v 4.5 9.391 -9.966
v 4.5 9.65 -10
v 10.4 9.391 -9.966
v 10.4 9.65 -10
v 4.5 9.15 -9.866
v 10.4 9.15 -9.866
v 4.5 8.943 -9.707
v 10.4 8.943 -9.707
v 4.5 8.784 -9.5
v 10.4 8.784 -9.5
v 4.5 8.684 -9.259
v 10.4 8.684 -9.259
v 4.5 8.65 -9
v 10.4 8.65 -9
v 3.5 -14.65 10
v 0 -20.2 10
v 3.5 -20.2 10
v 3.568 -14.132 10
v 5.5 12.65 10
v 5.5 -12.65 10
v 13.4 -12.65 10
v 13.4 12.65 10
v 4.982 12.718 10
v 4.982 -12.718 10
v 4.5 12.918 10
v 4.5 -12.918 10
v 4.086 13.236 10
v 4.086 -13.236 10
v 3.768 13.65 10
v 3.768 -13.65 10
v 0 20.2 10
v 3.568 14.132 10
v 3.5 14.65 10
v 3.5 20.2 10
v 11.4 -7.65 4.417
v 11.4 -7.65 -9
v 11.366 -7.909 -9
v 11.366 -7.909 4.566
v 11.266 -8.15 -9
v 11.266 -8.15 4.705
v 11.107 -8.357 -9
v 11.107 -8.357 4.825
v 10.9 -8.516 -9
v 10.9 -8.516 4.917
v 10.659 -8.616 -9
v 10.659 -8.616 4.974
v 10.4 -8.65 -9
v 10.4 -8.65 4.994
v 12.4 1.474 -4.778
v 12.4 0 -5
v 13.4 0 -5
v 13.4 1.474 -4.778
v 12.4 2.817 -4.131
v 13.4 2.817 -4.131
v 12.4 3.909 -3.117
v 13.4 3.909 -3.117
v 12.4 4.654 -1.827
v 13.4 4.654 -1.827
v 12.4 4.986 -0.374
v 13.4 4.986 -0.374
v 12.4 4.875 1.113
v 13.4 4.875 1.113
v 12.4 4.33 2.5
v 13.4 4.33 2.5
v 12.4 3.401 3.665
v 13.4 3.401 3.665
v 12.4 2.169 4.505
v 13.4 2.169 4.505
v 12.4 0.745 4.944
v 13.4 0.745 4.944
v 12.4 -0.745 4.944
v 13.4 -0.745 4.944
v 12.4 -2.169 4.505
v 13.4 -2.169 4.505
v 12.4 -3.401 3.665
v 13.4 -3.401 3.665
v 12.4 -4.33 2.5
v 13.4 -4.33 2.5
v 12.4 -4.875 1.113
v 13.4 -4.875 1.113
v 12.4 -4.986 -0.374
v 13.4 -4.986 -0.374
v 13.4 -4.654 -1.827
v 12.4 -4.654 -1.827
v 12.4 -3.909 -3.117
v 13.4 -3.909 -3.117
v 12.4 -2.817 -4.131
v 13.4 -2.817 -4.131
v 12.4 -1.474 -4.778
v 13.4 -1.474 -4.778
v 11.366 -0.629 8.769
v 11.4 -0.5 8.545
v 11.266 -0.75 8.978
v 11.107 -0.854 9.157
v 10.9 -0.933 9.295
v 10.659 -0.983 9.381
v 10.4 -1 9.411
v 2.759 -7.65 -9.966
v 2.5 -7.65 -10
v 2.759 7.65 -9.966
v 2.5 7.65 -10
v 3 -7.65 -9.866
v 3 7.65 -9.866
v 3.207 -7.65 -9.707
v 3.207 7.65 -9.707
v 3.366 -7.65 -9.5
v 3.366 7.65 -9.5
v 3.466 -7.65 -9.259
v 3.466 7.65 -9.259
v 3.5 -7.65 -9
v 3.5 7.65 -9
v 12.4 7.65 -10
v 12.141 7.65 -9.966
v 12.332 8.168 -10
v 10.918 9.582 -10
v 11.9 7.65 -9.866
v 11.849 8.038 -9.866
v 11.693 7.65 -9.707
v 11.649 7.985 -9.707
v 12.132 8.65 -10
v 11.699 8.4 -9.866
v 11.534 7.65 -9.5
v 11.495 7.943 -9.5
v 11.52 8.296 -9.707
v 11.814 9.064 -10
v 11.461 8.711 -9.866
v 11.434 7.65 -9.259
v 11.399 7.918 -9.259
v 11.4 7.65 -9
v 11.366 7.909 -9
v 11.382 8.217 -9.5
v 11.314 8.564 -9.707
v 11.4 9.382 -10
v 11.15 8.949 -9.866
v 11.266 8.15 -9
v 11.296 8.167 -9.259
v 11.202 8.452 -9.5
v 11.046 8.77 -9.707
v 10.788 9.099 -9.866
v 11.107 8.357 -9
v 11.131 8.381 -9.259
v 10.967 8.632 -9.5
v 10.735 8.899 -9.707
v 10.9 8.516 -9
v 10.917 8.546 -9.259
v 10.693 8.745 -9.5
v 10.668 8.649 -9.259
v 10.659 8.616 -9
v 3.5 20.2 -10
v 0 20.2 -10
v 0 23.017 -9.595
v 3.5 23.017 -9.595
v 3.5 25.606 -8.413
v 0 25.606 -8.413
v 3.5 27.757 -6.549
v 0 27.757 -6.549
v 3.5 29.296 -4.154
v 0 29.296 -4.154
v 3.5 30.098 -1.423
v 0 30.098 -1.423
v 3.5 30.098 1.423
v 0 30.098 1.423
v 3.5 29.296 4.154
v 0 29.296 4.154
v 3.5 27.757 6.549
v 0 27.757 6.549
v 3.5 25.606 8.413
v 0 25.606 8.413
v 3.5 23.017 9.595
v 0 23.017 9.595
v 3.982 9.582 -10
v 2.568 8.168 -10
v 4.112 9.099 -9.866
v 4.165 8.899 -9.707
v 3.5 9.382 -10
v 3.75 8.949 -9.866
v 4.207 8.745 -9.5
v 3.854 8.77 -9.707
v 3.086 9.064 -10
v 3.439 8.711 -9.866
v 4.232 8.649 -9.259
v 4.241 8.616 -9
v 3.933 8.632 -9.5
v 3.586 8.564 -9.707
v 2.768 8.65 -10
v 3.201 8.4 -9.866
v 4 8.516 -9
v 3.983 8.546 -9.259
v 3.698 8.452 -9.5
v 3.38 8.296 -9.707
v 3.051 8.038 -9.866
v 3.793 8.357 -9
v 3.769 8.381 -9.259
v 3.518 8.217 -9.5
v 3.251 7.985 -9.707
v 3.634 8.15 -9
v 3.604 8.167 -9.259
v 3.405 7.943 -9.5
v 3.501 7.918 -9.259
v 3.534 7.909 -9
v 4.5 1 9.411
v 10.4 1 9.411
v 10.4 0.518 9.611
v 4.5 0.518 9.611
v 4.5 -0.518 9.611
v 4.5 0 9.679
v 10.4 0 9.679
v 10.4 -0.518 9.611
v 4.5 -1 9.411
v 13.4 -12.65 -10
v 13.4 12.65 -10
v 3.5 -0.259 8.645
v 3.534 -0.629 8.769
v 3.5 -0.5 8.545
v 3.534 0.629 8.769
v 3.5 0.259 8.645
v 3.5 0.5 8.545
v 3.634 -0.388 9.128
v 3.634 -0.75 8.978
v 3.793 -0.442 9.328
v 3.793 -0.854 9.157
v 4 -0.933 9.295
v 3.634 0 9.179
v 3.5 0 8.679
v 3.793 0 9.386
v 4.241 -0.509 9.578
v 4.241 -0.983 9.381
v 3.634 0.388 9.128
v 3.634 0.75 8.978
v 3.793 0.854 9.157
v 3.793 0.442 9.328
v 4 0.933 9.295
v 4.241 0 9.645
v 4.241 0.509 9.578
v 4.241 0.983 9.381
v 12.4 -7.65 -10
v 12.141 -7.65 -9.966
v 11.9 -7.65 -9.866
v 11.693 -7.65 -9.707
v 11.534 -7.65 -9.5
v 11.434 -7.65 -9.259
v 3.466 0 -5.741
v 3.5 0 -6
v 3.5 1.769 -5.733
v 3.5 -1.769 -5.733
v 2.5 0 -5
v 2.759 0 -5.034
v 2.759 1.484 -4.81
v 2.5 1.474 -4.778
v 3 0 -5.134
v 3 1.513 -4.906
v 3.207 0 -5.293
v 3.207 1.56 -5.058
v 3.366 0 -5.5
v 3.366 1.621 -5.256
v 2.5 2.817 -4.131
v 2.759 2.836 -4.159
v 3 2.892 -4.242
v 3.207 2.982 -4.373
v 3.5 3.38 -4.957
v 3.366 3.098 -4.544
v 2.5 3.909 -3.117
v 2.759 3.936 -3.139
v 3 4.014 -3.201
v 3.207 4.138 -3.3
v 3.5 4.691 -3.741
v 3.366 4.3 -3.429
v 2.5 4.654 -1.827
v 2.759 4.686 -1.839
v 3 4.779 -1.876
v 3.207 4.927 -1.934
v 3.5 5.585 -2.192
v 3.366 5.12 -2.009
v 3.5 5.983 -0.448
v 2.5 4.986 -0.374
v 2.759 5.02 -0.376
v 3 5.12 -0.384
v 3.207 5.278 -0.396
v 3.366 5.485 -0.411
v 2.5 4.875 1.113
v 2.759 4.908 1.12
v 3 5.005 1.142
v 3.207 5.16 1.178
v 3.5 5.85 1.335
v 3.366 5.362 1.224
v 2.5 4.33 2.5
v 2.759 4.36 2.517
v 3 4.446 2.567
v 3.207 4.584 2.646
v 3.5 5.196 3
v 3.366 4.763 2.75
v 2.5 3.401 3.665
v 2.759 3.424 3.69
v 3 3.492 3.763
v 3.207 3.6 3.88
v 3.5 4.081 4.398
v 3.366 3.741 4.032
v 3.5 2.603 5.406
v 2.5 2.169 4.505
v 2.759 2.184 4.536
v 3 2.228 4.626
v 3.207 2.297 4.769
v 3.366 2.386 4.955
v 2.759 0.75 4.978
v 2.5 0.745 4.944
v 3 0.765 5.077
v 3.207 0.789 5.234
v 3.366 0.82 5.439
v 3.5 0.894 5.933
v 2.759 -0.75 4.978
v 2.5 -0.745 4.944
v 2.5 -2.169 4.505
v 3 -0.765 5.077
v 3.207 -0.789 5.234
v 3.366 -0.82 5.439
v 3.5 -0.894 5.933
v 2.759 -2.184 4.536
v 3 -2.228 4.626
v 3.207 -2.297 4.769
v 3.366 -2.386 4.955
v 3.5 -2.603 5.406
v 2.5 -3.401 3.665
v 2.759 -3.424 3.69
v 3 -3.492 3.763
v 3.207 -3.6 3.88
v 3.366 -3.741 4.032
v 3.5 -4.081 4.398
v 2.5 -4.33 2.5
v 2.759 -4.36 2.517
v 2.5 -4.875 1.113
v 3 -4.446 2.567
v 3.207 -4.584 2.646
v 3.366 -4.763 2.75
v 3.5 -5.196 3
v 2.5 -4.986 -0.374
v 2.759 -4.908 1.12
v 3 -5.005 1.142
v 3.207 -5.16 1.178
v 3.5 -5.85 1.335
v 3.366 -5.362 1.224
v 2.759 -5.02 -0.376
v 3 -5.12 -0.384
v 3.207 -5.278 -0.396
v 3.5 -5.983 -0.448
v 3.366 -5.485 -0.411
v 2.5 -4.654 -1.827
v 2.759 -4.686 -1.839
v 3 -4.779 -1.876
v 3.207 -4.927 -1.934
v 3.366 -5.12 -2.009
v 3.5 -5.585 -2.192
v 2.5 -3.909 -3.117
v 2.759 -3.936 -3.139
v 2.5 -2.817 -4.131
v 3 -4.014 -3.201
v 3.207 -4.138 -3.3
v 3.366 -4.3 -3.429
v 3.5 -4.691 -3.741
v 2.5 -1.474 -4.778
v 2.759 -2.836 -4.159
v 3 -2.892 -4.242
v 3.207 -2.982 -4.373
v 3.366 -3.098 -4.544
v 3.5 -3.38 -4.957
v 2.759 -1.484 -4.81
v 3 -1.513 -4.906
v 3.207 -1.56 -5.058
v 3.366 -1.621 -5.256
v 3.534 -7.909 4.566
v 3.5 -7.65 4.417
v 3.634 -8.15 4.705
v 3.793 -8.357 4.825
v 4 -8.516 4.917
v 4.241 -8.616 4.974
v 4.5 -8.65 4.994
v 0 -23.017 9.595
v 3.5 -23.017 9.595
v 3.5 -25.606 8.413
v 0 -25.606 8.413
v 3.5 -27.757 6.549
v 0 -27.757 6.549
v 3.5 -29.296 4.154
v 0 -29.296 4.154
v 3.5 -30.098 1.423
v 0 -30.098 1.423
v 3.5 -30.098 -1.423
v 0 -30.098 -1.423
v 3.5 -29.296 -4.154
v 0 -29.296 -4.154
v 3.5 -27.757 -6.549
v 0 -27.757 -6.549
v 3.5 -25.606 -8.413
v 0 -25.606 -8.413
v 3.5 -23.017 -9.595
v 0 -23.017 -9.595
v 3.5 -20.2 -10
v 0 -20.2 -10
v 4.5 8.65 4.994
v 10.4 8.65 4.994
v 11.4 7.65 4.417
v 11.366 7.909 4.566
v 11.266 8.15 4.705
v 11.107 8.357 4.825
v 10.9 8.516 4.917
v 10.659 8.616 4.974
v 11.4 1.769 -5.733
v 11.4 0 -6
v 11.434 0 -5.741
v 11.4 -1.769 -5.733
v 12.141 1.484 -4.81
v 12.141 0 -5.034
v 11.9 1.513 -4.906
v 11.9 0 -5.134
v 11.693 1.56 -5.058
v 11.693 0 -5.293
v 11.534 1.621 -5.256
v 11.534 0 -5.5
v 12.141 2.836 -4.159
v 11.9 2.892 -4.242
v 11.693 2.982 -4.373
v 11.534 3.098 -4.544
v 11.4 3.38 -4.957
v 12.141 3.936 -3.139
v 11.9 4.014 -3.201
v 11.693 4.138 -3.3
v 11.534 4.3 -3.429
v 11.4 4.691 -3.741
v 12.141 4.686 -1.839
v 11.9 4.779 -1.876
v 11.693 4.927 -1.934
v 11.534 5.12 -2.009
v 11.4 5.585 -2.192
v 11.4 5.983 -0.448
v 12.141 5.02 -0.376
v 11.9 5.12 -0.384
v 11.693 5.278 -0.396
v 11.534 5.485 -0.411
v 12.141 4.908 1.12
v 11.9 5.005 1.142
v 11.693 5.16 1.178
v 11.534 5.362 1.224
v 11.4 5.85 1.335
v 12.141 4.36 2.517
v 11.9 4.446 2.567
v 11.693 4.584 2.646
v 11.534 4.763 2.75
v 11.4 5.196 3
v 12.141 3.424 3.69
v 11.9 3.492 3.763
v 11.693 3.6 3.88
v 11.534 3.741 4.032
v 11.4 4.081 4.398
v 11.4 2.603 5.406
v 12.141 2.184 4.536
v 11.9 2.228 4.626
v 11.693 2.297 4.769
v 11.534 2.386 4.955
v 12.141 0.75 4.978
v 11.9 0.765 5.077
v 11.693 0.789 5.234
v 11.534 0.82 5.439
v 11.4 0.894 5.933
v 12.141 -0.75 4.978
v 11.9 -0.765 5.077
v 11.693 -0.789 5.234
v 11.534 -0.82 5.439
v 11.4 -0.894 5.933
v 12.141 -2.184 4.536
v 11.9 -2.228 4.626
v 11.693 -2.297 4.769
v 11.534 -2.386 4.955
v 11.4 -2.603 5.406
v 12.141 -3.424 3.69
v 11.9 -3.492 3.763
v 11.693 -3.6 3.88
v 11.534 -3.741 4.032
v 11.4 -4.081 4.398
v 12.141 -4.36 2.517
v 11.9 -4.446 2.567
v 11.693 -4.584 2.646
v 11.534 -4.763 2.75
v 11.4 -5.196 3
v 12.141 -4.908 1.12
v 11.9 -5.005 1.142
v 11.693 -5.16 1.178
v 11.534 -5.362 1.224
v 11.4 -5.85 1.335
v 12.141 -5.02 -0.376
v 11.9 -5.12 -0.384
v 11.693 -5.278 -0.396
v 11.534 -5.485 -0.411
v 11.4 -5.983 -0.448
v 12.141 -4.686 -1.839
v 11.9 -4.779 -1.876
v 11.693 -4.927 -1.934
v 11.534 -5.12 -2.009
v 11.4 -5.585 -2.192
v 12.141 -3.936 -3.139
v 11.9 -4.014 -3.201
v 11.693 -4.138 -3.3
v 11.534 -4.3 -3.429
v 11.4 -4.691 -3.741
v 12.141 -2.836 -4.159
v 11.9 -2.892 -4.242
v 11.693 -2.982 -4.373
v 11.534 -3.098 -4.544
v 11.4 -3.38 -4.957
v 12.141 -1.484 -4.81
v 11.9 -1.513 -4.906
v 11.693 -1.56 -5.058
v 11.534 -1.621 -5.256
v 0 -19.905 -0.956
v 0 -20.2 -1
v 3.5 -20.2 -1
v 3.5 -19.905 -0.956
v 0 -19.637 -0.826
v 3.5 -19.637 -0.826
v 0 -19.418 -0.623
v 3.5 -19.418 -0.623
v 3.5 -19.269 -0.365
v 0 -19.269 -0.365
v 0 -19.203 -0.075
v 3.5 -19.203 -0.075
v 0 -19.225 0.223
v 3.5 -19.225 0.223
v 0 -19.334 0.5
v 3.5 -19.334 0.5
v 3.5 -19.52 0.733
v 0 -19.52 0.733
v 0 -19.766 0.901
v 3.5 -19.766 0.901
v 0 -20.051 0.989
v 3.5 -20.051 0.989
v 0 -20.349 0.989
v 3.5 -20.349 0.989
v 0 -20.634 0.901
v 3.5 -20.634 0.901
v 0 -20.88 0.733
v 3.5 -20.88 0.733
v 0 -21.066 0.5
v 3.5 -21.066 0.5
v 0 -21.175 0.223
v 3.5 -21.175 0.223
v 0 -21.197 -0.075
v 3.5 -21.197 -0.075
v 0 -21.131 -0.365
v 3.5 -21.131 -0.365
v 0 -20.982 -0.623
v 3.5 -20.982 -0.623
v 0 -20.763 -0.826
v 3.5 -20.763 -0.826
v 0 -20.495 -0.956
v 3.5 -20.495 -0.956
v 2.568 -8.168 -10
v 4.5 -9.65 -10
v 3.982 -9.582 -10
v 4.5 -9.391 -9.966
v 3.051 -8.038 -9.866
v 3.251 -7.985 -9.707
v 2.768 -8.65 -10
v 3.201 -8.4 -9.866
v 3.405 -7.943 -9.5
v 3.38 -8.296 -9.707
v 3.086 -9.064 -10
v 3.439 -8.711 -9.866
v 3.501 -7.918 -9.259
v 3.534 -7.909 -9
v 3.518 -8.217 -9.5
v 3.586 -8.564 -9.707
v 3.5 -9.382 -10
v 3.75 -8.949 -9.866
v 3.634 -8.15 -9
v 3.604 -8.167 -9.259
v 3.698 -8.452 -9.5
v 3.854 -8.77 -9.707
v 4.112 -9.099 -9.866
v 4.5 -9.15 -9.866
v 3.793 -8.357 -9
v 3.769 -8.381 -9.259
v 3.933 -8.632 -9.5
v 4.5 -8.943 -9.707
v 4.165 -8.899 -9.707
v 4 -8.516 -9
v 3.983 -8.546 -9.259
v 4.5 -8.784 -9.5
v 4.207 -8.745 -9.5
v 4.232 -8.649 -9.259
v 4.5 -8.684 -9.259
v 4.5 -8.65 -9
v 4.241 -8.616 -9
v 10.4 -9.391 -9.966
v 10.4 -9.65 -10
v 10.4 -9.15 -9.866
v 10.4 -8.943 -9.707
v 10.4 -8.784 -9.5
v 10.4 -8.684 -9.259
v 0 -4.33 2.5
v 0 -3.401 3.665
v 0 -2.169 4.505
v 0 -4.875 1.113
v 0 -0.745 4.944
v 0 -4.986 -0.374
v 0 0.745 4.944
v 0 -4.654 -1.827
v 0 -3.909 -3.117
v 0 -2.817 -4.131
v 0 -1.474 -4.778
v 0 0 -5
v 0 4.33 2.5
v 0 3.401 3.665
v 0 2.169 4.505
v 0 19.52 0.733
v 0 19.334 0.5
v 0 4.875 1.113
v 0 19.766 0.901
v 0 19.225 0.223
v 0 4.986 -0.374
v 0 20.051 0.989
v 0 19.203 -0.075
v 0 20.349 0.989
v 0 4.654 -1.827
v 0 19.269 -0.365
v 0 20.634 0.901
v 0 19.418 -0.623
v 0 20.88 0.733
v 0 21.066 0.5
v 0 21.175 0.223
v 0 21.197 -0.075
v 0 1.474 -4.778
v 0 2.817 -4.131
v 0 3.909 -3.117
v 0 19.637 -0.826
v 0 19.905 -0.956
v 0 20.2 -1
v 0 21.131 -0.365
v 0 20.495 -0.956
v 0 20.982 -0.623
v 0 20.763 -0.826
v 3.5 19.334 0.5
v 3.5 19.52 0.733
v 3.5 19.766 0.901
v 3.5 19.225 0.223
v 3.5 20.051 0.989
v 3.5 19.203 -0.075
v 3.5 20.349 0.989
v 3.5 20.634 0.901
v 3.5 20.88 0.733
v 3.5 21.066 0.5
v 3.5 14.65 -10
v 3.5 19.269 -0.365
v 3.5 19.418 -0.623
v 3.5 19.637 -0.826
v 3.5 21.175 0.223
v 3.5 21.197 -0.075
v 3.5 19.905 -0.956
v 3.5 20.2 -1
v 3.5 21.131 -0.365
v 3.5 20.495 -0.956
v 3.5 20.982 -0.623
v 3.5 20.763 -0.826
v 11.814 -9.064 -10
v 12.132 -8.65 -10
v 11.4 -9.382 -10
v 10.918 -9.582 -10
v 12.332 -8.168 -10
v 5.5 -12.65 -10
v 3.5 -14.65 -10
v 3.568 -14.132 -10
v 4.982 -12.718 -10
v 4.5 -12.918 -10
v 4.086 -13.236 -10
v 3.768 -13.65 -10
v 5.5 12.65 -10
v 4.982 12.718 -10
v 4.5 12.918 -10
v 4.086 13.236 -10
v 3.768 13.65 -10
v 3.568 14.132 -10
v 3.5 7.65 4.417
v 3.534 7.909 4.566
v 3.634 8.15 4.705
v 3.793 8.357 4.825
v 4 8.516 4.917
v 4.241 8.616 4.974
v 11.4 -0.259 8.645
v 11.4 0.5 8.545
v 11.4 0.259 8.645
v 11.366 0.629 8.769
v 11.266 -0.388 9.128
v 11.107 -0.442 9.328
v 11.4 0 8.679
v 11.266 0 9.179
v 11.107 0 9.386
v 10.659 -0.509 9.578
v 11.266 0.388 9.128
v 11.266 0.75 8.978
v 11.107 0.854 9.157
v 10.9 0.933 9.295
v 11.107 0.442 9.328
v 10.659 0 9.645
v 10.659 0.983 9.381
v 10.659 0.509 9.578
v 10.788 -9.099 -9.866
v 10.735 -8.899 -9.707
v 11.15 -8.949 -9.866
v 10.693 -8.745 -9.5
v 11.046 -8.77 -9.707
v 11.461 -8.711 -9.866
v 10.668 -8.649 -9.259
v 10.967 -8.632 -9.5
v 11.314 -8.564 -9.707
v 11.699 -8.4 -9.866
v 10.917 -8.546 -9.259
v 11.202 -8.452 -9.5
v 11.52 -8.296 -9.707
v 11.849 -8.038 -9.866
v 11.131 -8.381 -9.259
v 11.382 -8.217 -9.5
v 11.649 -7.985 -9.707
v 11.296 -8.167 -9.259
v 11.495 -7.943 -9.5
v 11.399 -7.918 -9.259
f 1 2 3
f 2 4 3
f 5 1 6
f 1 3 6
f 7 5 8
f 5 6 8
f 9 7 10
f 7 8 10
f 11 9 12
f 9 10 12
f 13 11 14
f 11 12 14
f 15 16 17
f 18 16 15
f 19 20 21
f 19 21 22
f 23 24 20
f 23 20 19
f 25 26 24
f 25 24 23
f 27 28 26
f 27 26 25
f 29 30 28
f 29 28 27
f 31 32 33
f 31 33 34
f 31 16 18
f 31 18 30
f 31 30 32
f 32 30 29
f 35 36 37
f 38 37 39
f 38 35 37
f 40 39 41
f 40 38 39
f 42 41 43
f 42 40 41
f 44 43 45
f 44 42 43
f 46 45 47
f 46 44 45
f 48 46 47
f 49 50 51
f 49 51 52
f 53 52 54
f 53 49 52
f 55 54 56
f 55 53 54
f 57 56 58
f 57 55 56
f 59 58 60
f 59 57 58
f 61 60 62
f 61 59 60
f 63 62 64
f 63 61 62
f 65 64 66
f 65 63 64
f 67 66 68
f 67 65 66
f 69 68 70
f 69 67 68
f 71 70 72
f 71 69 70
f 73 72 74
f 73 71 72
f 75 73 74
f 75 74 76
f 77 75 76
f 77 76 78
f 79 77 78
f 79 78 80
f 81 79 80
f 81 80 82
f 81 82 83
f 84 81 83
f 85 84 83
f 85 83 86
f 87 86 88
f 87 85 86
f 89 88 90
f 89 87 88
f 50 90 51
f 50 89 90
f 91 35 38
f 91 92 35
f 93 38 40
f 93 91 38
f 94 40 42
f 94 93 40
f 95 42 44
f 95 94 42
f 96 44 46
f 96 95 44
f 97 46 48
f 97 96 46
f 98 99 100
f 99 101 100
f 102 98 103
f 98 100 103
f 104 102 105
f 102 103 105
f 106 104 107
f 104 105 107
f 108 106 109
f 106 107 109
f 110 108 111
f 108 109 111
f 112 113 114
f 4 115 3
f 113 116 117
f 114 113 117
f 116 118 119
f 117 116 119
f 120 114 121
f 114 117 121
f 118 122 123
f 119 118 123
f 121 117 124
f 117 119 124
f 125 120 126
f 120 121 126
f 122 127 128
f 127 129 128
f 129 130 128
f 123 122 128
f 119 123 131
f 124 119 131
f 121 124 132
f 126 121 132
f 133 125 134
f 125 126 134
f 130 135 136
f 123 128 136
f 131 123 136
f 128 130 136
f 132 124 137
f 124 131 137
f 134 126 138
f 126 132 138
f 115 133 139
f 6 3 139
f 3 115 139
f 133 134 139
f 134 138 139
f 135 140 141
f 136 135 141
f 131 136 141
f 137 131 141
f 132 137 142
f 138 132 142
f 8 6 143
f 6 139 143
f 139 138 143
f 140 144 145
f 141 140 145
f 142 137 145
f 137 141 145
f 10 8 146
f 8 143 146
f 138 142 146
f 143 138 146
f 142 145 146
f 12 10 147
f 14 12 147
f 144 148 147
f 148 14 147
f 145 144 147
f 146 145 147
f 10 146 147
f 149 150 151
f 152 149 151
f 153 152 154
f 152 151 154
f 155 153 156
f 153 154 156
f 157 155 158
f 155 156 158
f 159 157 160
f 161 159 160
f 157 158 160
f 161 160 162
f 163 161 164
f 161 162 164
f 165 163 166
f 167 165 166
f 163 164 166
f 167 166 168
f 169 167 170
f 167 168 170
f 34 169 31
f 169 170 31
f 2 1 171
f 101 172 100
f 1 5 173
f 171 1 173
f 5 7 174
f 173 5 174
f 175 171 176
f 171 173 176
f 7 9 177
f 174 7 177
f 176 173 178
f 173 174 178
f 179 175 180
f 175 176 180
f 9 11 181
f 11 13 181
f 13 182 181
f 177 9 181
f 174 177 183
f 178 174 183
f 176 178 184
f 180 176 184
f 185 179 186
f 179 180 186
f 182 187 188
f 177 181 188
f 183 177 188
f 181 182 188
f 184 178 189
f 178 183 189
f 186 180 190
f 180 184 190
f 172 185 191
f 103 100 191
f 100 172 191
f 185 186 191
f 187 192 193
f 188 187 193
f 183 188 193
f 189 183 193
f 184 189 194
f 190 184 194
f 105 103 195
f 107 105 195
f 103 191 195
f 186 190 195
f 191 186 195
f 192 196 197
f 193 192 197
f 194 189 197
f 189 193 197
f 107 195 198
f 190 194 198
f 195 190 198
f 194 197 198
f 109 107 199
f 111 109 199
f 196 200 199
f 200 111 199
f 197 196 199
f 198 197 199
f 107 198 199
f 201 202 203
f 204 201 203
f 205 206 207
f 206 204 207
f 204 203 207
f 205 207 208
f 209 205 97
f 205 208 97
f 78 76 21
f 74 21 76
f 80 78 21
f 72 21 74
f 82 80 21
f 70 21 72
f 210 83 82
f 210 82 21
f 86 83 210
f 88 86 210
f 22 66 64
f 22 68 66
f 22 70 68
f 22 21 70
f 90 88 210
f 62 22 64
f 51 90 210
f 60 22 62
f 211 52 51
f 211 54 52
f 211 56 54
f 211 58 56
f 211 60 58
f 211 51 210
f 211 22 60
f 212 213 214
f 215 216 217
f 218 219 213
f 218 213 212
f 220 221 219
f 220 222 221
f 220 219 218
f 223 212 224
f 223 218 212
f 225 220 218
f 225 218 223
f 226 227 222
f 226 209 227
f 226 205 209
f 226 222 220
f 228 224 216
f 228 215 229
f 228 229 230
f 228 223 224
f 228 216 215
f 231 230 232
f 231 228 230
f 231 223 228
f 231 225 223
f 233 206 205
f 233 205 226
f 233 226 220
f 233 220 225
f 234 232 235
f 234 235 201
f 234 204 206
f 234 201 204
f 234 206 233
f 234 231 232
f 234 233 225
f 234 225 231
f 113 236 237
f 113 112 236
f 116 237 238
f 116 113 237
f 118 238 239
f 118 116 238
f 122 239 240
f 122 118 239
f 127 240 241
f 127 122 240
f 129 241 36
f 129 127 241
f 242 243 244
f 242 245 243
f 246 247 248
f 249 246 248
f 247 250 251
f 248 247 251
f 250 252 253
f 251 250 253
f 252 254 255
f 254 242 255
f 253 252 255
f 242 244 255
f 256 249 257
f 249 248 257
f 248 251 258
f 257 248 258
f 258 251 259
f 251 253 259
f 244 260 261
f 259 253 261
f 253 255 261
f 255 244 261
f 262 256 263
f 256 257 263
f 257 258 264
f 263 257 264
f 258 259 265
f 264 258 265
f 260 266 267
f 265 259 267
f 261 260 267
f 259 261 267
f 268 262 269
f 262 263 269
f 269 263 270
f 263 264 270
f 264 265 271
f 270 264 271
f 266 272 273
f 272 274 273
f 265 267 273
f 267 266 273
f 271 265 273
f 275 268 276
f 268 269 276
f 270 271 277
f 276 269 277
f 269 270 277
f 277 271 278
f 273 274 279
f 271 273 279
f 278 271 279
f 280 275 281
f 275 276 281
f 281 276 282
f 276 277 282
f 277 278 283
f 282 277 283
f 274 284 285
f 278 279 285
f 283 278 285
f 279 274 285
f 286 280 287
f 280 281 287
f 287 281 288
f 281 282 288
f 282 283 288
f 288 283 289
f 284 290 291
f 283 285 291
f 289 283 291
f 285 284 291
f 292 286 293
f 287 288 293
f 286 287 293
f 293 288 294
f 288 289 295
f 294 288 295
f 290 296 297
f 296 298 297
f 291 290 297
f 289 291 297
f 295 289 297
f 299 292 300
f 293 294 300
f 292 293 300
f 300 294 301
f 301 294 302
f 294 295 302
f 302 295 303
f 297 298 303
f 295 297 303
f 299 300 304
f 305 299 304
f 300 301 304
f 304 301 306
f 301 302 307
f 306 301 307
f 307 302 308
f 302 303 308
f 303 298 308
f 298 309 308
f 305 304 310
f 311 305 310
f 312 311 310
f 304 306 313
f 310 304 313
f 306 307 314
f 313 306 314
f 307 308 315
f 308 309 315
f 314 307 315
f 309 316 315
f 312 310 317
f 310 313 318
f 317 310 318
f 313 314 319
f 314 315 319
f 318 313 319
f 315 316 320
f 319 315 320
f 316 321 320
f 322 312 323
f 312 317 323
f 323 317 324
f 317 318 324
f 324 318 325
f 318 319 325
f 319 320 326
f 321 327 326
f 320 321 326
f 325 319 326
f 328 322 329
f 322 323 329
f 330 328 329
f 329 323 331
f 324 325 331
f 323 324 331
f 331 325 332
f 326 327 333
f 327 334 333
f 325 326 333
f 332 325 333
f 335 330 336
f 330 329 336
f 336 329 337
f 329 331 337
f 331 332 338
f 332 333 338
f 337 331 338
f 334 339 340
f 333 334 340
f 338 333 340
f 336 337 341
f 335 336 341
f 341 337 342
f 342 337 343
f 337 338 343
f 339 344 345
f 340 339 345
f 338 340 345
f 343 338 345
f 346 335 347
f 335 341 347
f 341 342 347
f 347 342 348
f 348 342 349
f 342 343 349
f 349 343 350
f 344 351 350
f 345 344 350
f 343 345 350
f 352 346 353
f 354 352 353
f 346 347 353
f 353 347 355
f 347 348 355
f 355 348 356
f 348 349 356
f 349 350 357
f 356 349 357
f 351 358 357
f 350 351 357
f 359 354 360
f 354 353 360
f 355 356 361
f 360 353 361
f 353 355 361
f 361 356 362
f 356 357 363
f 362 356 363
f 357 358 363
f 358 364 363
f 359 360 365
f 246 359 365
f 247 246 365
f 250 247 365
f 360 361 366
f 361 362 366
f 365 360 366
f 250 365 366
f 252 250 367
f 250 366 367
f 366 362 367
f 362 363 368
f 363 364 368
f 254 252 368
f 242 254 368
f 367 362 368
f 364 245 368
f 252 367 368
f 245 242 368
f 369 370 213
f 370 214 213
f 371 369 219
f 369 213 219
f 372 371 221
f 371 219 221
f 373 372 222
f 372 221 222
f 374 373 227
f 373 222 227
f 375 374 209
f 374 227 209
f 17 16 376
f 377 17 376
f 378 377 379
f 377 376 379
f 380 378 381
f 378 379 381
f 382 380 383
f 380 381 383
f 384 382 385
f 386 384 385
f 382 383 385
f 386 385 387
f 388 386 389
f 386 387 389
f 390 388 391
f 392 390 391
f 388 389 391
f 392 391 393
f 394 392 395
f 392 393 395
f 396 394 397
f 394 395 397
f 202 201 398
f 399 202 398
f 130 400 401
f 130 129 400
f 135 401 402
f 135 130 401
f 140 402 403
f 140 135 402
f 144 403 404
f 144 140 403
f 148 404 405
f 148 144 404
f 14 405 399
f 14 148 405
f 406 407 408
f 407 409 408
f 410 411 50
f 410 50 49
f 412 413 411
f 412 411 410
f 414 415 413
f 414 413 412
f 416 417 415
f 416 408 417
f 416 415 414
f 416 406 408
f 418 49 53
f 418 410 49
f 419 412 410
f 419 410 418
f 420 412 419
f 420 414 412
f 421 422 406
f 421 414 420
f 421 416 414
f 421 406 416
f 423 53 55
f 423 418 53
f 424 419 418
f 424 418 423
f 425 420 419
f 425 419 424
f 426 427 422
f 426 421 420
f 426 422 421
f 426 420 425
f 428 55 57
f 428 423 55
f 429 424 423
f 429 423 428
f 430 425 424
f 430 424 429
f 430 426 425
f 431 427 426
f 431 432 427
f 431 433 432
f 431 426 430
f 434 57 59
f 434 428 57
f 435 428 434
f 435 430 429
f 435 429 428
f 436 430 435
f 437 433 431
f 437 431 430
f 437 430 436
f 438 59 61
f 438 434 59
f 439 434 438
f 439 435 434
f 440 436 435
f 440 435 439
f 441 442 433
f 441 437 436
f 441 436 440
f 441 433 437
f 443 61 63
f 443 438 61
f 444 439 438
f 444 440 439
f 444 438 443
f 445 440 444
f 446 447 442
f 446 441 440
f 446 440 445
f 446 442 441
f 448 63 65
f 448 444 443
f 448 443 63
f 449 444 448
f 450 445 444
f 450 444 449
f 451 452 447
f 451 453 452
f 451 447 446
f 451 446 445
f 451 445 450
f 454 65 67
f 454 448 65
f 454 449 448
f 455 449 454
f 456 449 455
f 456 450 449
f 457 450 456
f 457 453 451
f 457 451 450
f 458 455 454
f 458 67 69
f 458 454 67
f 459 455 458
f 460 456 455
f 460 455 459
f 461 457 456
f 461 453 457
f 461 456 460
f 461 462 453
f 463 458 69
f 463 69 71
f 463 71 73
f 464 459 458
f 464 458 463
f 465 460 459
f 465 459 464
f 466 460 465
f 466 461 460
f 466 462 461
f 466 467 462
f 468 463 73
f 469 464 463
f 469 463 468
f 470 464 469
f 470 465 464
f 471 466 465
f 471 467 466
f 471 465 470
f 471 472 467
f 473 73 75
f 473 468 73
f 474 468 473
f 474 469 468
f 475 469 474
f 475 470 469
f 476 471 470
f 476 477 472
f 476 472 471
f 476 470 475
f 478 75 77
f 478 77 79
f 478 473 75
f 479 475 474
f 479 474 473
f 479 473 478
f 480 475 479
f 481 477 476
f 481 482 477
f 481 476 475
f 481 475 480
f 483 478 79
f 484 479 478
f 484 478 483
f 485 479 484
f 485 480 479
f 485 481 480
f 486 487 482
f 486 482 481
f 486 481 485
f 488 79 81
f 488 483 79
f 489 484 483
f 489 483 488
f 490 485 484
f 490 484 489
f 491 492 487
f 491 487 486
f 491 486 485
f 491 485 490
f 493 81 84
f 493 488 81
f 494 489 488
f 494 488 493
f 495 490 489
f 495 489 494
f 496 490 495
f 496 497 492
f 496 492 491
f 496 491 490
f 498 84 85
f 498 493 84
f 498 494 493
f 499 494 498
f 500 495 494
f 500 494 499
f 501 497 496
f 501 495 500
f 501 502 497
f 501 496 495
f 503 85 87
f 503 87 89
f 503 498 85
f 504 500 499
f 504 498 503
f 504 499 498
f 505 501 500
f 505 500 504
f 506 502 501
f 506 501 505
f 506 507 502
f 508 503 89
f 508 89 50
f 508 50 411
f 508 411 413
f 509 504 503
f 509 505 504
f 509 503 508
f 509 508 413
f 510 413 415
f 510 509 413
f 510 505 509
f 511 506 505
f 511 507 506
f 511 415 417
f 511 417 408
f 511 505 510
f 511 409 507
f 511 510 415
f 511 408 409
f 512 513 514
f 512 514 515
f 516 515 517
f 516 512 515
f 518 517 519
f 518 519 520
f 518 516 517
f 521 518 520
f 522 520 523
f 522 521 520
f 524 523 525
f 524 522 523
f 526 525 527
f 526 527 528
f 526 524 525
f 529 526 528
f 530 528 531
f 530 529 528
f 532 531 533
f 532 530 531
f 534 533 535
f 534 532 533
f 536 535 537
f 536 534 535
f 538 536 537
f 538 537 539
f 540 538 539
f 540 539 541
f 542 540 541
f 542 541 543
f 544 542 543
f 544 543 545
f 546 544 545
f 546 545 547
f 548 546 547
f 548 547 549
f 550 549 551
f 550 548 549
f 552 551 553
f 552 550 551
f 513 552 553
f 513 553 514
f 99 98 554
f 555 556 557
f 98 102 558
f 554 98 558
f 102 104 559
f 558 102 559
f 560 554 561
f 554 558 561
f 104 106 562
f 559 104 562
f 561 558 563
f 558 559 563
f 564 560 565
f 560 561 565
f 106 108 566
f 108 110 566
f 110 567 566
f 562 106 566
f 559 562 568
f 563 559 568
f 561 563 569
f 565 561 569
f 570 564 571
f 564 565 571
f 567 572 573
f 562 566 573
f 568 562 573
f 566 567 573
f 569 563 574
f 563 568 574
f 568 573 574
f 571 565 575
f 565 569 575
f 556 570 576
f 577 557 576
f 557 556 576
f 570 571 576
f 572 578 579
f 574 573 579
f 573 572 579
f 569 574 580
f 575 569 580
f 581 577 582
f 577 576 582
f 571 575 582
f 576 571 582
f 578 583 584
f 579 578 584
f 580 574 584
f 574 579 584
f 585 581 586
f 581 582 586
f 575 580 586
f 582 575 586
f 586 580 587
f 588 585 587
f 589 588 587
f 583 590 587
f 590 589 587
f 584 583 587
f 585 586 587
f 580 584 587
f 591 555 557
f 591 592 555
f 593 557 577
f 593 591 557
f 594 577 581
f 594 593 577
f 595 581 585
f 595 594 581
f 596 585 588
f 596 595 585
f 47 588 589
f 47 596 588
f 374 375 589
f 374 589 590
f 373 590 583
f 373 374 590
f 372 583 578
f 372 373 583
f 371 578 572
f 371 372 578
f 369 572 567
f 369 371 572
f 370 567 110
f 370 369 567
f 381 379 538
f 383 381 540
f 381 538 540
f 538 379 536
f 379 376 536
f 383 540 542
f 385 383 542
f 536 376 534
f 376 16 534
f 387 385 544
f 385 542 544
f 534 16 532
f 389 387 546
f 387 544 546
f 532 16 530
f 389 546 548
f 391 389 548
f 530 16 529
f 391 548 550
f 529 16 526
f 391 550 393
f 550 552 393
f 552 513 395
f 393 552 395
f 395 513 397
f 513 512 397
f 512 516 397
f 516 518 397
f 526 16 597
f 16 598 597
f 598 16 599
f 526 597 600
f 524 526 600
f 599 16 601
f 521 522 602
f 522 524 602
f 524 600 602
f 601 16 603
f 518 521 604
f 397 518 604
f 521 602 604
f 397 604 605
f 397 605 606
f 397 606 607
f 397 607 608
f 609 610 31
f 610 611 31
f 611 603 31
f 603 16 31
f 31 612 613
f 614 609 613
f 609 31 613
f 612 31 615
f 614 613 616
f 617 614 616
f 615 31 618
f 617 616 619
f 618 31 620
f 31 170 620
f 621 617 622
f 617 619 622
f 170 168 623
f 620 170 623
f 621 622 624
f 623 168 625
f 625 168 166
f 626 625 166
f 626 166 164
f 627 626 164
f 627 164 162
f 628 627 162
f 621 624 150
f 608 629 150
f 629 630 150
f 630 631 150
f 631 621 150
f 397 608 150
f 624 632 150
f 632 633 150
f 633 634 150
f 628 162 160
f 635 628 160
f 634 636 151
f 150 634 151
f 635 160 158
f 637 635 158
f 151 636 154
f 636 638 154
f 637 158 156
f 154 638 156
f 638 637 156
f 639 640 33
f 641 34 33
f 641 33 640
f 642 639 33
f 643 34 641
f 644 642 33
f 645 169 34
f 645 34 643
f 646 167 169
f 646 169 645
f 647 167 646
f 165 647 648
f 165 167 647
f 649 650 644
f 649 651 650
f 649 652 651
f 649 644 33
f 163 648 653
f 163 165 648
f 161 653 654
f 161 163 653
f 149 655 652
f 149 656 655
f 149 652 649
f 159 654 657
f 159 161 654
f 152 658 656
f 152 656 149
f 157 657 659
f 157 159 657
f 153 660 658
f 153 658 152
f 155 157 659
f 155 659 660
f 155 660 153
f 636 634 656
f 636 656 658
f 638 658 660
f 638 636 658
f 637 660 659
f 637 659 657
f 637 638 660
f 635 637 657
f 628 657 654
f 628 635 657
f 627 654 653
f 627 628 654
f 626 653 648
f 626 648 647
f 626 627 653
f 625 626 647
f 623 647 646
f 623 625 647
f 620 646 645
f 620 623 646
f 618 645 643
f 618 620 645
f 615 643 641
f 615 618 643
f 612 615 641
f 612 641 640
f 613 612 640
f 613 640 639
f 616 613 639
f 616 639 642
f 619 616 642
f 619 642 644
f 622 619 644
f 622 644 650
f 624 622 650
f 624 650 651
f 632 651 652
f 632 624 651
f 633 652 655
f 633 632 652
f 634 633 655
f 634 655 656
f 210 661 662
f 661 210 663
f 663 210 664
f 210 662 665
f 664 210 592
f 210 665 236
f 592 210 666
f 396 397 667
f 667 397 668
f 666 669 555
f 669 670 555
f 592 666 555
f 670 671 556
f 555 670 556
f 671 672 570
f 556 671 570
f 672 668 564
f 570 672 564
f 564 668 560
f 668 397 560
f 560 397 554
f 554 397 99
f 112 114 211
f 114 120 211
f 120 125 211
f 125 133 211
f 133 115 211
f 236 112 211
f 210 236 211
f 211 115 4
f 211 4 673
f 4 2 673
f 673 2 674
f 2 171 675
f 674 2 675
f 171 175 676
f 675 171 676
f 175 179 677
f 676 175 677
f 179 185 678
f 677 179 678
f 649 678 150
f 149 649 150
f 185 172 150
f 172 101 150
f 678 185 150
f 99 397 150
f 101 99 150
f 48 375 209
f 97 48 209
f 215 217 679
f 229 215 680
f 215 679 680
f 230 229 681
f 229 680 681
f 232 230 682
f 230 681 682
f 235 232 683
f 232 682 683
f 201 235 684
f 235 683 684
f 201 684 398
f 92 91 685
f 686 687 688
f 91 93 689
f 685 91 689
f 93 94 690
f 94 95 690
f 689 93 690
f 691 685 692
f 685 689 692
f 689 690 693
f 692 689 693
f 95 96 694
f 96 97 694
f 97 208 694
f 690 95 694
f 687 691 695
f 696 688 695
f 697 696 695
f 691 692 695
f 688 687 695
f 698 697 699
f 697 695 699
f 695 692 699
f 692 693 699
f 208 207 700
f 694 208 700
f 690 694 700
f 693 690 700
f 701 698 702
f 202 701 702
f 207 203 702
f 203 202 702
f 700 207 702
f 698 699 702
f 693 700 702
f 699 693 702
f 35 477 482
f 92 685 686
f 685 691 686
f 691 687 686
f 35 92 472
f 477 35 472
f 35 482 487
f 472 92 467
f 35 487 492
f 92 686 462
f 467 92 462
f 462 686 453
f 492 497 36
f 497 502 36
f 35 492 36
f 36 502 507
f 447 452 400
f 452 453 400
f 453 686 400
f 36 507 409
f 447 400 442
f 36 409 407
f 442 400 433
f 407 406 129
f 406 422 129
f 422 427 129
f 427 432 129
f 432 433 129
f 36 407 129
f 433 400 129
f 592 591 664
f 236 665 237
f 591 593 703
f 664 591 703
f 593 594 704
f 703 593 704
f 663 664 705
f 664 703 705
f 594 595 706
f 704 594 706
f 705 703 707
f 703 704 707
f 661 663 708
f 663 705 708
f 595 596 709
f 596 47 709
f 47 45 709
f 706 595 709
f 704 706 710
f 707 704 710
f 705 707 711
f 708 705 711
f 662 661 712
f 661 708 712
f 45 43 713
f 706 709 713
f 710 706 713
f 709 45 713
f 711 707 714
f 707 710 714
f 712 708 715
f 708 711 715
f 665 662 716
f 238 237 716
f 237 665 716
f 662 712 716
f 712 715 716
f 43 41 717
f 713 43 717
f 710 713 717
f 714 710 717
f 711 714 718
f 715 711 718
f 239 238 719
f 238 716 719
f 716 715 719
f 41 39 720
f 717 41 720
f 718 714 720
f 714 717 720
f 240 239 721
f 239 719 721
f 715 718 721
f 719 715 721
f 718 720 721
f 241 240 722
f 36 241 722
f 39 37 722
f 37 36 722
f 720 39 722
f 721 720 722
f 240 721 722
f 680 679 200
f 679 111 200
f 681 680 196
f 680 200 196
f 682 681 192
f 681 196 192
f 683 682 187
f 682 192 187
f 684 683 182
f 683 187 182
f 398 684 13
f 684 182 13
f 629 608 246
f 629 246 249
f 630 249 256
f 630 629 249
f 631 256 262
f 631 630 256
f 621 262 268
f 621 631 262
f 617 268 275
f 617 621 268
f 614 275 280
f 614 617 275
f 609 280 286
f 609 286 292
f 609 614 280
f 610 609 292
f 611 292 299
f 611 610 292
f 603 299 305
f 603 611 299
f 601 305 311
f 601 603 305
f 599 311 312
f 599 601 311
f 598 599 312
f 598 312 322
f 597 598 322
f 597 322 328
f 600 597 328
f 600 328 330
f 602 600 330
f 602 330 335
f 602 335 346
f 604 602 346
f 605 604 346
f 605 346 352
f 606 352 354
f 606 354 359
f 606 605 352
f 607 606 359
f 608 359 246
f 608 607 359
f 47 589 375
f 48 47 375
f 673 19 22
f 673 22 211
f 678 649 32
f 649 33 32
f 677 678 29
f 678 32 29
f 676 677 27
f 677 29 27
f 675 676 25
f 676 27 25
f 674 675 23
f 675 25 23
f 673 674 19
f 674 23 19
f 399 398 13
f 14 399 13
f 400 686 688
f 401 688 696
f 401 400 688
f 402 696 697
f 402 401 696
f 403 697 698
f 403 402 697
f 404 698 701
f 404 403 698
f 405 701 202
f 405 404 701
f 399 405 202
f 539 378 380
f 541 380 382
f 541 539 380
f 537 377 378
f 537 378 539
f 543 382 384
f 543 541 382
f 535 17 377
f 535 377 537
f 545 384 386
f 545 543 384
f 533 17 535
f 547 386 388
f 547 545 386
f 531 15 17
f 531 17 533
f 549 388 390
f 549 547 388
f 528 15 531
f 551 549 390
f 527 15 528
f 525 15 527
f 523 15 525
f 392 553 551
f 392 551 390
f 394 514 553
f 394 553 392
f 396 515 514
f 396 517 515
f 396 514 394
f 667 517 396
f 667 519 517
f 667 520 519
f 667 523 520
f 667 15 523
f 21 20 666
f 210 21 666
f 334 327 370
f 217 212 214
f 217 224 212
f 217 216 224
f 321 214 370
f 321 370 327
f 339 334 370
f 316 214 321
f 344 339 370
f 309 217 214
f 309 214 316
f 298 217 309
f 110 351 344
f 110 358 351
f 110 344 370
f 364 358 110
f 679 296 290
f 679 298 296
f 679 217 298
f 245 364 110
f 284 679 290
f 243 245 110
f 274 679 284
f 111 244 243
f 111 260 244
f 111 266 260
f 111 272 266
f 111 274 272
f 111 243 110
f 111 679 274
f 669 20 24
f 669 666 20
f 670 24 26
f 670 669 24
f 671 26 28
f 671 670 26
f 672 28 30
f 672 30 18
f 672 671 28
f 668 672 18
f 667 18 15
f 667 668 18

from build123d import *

# Parameters (mm, degrees)
SKETCH1_R           = 5
SKETCH1_R_2         = 1
BOSS_EXTRUDE1_DEPTH = 3.5
BOSS_EXTRUDE2_DEPTH = 7.9
SKETCH3_W           = 20
SKETCH3_H           = 25.3
SKETCH3_R           = 5
BOSS_EXTRUDE3_DEPTH = 2
FILLET1_R           = 2
FILLET2_R           = 1


with BuildPart() as part:
    # Sketch1 → Boss-Extrude1 (new body)
    with BuildSketch(Plane(origin=(0, 0, 0), x_dir=(0, 0, -1), z_dir=(1, 0, 0))):
        with BuildLine():
            Line((10, -20.2), (10, 20.2))
            ThreePointArc((10, 20.2), (0, 30.2), (-10, 20.2))
            Line((-10, 20.2), (-10, -20.2))
            ThreePointArc((-10, -20.2), (0, -30.2), (10, -20.2))
        make_face()
        Circle(SKETCH1_R, mode=Mode.SUBTRACT)
        with Locations((0, 20.2)):
            Circle(SKETCH1_R_2, mode=Mode.SUBTRACT)
        with Locations((0, -20.2)):
            Circle(SKETCH1_R_2, mode=Mode.SUBTRACT)
    extrude(amount=BOSS_EXTRUDE1_DEPTH)

    # Sketch2 → Boss-Extrude2 (add)
    with BuildSketch(Plane(origin=(3.5, 0, 0), x_dir=(0, 0, -1), z_dir=(1, 0, 0))):
        Polygon((-9.988159657, 0), (-4.994079828, 8.65), (10, 8.65), (10, 12.65), (-10, 12.65), (-10, -12.65), (10, -12.65), (10, -8.65), (-4.994079828, -8.65), align=None)
    extrude(amount=BOSS_EXTRUDE2_DEPTH)

    # Sketch3 → Boss-Extrude3 (add)
    with BuildSketch(Plane(origin=(11.4, 0, 0), x_dir=(0, 0, -1), z_dir=(1, 0, 0))):
        Rectangle(SKETCH3_W, SKETCH3_H)
        Circle(SKETCH3_R, mode=Mode.SUBTRACT)
    extrude(amount=BOSS_EXTRUDE3_DEPTH)

    # Fillet1
    fillet1_edges = [part.edges().sort_by_distance(p)[0] for p in [
        (7.45, 0, 9.988159657),
        (3.5, -12.65, 0),
        (3.5, 12.65, 0),
    ]]
    fillet(fillet1_edges, radius=FILLET1_R)

    # Fillet2
    fillet2_edges = [part.edges().sort_by_distance(p)[0] for p in [
        (3.5, 0, -10),
        (11.4, -8.65, -2.502960086),
        (7.45, -8.65, -10),
        (11.4, 4.825, 7.202444608),
        (3.5, 8.65, -2.502960086),
        (7.45, 8.65, -10),
        (11.4, 8.65, -2.502960086),
        (3.5, -8.65, -2.502960086),
        (3.5, 4.825, 7.202444608),
        (11.4, 0, 5),
        (11.4, 0, -10),
        (3.5, -4.825, 7.202444608),
        (3.5, 0, 9.67875858),
        (11.4, -4.825, 7.202444608),
        (11.4, 0, 9.67875858),
        (3.5, 0, 5),
    ]]
    fillet(fillet2_edges, radius=FILLET2_R)


solid = part.part
